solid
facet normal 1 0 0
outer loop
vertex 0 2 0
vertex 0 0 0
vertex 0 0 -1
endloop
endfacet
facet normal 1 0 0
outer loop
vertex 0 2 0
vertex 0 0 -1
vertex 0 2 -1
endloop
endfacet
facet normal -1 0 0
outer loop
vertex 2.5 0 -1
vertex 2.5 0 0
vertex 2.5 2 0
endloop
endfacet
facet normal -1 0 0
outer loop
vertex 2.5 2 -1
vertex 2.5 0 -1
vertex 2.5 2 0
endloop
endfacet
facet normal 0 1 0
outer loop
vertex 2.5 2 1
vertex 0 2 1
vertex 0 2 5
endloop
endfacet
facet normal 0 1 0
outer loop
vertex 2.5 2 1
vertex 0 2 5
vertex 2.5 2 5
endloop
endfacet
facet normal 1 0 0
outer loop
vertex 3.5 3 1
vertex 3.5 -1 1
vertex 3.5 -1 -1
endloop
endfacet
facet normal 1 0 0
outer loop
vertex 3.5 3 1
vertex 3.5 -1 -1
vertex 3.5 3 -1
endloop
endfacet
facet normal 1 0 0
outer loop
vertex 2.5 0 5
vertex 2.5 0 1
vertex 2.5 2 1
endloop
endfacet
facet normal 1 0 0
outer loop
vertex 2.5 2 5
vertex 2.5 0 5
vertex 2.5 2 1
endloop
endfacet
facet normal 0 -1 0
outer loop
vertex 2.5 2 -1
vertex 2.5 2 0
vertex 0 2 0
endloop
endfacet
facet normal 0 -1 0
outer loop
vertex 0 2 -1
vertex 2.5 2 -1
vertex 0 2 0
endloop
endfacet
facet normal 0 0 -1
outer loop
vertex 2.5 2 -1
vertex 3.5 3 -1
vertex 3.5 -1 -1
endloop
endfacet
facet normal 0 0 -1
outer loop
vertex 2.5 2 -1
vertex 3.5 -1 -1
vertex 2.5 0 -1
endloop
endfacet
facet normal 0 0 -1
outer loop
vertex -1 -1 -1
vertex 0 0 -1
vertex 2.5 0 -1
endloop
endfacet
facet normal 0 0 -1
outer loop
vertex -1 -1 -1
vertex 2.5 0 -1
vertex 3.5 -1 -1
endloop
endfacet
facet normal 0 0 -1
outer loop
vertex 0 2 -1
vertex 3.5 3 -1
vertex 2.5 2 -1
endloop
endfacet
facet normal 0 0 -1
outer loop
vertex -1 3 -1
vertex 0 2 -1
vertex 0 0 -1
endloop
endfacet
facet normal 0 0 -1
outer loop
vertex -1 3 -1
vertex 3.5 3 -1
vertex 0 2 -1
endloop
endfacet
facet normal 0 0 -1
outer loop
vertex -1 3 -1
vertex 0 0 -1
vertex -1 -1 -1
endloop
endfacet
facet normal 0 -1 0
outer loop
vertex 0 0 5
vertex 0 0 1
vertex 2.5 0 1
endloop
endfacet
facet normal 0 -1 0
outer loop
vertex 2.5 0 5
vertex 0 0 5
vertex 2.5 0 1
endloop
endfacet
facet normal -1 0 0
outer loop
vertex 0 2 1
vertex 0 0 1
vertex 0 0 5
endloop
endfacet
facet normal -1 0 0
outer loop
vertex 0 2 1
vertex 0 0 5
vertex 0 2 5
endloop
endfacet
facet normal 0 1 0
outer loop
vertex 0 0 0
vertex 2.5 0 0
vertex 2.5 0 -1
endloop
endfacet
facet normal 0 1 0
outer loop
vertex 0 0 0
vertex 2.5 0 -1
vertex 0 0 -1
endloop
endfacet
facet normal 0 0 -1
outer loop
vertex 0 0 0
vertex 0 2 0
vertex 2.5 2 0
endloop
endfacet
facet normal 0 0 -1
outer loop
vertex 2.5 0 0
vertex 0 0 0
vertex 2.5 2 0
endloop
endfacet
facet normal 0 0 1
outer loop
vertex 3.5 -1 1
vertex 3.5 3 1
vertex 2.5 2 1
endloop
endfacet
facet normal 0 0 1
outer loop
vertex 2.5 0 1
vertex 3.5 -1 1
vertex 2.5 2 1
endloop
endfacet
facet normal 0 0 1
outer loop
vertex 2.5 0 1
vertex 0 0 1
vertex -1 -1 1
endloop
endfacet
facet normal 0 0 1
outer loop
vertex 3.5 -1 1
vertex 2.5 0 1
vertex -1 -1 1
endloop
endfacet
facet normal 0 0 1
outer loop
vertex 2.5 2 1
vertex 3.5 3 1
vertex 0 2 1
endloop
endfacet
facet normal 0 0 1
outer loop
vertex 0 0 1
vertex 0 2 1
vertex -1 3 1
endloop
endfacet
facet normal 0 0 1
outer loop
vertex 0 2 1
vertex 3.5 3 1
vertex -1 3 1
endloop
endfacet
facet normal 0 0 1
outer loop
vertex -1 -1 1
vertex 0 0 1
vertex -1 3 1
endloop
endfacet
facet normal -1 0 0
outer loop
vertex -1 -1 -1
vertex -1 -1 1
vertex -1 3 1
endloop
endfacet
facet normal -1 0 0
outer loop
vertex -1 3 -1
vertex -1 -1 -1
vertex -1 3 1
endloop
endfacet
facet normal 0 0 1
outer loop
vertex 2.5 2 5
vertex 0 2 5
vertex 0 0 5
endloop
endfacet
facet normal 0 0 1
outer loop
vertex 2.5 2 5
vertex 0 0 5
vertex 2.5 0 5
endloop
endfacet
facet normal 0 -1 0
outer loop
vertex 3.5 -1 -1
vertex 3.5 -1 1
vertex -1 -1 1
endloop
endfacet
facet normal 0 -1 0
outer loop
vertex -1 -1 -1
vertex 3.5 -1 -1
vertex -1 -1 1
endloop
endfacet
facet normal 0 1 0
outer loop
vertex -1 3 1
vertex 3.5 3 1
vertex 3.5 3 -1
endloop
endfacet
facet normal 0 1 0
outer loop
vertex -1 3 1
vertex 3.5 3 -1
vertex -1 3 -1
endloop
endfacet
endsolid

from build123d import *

# Parameters (mm, degrees)
SKETCH_1_W           = 2.5
SKETCH_1_H           = 2
EXTRUDE_1_DEPTH      = 5
EXTRUDE_3_DEPTH      = 1
EXTRUDE_3_DEPTH_BACK = 1
SKETCH_2_W           = 4.5
SKETCH_2_H           = 4
SKETCH_2_W_2         = 2.5
SKETCH_2_H_2         = 2


with BuildPart() as part:
    # 草图1 → 凸台-拉伸1 (new body)
    with BuildSketch(Plane.XY):
        with Locations((1.25, 1)):
            Rectangle(SKETCH_1_W, SKETCH_1_H)
    extrude(amount=EXTRUDE_1_DEPTH)

    # 草图2 → 凸台-拉伸3 (add, two sides: drawn at the far end of the back side and taken through both)
    with BuildSketch(Plane(origin=(0, 0, 0), x_dir=(-1, 0, 0), z_dir=(0, 0, -1)).offset(-EXTRUDE_3_DEPTH_BACK)):
        with Locations((-1.25, 1)):
            Rectangle(SKETCH_2_W, SKETCH_2_H)
        with Locations((-1.25, 1)):
            Rectangle(SKETCH_2_W_2, SKETCH_2_H_2, mode=Mode.SUBTRACT)
    extrude(amount=EXTRUDE_3_DEPTH + EXTRUDE_3_DEPTH_BACK)


solid = part.part
